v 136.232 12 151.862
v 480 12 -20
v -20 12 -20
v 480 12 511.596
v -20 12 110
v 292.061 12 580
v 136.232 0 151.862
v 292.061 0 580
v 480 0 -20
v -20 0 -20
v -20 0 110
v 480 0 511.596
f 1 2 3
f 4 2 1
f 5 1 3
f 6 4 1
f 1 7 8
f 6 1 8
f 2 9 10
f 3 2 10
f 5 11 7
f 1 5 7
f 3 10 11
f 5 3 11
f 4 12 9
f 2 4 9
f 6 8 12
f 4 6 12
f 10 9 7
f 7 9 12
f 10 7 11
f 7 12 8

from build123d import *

# Parameters (mm, degrees)
PAD_DEPTH    = 12
POCKET_DEPTH = 1


with BuildPart() as part:
    # Sketch001 → Pad (new body)
    with BuildSketch(Plane.XZ):
        Polygon((-20, -20), (-20, 110), (136.232082, 151.86226), (292.061476, 580), (480, 511.595971), (480, -20), align=None)
    extrude(amount=-PAD_DEPTH)

    # Sketch002 (on Face7 of Pad) → Pocket (cut)
    with BuildSketch(Plane.XZ):
        Polygon((465, -5), (465, 501.092858), (301.026563, 560.774309), (147.656805, 139.394363), (-5, 98.490095), (-5, -5), align=None)
    extrude(amount=POCKET_DEPTH, mode=Mode.SUBTRACT)


solid = part.part
